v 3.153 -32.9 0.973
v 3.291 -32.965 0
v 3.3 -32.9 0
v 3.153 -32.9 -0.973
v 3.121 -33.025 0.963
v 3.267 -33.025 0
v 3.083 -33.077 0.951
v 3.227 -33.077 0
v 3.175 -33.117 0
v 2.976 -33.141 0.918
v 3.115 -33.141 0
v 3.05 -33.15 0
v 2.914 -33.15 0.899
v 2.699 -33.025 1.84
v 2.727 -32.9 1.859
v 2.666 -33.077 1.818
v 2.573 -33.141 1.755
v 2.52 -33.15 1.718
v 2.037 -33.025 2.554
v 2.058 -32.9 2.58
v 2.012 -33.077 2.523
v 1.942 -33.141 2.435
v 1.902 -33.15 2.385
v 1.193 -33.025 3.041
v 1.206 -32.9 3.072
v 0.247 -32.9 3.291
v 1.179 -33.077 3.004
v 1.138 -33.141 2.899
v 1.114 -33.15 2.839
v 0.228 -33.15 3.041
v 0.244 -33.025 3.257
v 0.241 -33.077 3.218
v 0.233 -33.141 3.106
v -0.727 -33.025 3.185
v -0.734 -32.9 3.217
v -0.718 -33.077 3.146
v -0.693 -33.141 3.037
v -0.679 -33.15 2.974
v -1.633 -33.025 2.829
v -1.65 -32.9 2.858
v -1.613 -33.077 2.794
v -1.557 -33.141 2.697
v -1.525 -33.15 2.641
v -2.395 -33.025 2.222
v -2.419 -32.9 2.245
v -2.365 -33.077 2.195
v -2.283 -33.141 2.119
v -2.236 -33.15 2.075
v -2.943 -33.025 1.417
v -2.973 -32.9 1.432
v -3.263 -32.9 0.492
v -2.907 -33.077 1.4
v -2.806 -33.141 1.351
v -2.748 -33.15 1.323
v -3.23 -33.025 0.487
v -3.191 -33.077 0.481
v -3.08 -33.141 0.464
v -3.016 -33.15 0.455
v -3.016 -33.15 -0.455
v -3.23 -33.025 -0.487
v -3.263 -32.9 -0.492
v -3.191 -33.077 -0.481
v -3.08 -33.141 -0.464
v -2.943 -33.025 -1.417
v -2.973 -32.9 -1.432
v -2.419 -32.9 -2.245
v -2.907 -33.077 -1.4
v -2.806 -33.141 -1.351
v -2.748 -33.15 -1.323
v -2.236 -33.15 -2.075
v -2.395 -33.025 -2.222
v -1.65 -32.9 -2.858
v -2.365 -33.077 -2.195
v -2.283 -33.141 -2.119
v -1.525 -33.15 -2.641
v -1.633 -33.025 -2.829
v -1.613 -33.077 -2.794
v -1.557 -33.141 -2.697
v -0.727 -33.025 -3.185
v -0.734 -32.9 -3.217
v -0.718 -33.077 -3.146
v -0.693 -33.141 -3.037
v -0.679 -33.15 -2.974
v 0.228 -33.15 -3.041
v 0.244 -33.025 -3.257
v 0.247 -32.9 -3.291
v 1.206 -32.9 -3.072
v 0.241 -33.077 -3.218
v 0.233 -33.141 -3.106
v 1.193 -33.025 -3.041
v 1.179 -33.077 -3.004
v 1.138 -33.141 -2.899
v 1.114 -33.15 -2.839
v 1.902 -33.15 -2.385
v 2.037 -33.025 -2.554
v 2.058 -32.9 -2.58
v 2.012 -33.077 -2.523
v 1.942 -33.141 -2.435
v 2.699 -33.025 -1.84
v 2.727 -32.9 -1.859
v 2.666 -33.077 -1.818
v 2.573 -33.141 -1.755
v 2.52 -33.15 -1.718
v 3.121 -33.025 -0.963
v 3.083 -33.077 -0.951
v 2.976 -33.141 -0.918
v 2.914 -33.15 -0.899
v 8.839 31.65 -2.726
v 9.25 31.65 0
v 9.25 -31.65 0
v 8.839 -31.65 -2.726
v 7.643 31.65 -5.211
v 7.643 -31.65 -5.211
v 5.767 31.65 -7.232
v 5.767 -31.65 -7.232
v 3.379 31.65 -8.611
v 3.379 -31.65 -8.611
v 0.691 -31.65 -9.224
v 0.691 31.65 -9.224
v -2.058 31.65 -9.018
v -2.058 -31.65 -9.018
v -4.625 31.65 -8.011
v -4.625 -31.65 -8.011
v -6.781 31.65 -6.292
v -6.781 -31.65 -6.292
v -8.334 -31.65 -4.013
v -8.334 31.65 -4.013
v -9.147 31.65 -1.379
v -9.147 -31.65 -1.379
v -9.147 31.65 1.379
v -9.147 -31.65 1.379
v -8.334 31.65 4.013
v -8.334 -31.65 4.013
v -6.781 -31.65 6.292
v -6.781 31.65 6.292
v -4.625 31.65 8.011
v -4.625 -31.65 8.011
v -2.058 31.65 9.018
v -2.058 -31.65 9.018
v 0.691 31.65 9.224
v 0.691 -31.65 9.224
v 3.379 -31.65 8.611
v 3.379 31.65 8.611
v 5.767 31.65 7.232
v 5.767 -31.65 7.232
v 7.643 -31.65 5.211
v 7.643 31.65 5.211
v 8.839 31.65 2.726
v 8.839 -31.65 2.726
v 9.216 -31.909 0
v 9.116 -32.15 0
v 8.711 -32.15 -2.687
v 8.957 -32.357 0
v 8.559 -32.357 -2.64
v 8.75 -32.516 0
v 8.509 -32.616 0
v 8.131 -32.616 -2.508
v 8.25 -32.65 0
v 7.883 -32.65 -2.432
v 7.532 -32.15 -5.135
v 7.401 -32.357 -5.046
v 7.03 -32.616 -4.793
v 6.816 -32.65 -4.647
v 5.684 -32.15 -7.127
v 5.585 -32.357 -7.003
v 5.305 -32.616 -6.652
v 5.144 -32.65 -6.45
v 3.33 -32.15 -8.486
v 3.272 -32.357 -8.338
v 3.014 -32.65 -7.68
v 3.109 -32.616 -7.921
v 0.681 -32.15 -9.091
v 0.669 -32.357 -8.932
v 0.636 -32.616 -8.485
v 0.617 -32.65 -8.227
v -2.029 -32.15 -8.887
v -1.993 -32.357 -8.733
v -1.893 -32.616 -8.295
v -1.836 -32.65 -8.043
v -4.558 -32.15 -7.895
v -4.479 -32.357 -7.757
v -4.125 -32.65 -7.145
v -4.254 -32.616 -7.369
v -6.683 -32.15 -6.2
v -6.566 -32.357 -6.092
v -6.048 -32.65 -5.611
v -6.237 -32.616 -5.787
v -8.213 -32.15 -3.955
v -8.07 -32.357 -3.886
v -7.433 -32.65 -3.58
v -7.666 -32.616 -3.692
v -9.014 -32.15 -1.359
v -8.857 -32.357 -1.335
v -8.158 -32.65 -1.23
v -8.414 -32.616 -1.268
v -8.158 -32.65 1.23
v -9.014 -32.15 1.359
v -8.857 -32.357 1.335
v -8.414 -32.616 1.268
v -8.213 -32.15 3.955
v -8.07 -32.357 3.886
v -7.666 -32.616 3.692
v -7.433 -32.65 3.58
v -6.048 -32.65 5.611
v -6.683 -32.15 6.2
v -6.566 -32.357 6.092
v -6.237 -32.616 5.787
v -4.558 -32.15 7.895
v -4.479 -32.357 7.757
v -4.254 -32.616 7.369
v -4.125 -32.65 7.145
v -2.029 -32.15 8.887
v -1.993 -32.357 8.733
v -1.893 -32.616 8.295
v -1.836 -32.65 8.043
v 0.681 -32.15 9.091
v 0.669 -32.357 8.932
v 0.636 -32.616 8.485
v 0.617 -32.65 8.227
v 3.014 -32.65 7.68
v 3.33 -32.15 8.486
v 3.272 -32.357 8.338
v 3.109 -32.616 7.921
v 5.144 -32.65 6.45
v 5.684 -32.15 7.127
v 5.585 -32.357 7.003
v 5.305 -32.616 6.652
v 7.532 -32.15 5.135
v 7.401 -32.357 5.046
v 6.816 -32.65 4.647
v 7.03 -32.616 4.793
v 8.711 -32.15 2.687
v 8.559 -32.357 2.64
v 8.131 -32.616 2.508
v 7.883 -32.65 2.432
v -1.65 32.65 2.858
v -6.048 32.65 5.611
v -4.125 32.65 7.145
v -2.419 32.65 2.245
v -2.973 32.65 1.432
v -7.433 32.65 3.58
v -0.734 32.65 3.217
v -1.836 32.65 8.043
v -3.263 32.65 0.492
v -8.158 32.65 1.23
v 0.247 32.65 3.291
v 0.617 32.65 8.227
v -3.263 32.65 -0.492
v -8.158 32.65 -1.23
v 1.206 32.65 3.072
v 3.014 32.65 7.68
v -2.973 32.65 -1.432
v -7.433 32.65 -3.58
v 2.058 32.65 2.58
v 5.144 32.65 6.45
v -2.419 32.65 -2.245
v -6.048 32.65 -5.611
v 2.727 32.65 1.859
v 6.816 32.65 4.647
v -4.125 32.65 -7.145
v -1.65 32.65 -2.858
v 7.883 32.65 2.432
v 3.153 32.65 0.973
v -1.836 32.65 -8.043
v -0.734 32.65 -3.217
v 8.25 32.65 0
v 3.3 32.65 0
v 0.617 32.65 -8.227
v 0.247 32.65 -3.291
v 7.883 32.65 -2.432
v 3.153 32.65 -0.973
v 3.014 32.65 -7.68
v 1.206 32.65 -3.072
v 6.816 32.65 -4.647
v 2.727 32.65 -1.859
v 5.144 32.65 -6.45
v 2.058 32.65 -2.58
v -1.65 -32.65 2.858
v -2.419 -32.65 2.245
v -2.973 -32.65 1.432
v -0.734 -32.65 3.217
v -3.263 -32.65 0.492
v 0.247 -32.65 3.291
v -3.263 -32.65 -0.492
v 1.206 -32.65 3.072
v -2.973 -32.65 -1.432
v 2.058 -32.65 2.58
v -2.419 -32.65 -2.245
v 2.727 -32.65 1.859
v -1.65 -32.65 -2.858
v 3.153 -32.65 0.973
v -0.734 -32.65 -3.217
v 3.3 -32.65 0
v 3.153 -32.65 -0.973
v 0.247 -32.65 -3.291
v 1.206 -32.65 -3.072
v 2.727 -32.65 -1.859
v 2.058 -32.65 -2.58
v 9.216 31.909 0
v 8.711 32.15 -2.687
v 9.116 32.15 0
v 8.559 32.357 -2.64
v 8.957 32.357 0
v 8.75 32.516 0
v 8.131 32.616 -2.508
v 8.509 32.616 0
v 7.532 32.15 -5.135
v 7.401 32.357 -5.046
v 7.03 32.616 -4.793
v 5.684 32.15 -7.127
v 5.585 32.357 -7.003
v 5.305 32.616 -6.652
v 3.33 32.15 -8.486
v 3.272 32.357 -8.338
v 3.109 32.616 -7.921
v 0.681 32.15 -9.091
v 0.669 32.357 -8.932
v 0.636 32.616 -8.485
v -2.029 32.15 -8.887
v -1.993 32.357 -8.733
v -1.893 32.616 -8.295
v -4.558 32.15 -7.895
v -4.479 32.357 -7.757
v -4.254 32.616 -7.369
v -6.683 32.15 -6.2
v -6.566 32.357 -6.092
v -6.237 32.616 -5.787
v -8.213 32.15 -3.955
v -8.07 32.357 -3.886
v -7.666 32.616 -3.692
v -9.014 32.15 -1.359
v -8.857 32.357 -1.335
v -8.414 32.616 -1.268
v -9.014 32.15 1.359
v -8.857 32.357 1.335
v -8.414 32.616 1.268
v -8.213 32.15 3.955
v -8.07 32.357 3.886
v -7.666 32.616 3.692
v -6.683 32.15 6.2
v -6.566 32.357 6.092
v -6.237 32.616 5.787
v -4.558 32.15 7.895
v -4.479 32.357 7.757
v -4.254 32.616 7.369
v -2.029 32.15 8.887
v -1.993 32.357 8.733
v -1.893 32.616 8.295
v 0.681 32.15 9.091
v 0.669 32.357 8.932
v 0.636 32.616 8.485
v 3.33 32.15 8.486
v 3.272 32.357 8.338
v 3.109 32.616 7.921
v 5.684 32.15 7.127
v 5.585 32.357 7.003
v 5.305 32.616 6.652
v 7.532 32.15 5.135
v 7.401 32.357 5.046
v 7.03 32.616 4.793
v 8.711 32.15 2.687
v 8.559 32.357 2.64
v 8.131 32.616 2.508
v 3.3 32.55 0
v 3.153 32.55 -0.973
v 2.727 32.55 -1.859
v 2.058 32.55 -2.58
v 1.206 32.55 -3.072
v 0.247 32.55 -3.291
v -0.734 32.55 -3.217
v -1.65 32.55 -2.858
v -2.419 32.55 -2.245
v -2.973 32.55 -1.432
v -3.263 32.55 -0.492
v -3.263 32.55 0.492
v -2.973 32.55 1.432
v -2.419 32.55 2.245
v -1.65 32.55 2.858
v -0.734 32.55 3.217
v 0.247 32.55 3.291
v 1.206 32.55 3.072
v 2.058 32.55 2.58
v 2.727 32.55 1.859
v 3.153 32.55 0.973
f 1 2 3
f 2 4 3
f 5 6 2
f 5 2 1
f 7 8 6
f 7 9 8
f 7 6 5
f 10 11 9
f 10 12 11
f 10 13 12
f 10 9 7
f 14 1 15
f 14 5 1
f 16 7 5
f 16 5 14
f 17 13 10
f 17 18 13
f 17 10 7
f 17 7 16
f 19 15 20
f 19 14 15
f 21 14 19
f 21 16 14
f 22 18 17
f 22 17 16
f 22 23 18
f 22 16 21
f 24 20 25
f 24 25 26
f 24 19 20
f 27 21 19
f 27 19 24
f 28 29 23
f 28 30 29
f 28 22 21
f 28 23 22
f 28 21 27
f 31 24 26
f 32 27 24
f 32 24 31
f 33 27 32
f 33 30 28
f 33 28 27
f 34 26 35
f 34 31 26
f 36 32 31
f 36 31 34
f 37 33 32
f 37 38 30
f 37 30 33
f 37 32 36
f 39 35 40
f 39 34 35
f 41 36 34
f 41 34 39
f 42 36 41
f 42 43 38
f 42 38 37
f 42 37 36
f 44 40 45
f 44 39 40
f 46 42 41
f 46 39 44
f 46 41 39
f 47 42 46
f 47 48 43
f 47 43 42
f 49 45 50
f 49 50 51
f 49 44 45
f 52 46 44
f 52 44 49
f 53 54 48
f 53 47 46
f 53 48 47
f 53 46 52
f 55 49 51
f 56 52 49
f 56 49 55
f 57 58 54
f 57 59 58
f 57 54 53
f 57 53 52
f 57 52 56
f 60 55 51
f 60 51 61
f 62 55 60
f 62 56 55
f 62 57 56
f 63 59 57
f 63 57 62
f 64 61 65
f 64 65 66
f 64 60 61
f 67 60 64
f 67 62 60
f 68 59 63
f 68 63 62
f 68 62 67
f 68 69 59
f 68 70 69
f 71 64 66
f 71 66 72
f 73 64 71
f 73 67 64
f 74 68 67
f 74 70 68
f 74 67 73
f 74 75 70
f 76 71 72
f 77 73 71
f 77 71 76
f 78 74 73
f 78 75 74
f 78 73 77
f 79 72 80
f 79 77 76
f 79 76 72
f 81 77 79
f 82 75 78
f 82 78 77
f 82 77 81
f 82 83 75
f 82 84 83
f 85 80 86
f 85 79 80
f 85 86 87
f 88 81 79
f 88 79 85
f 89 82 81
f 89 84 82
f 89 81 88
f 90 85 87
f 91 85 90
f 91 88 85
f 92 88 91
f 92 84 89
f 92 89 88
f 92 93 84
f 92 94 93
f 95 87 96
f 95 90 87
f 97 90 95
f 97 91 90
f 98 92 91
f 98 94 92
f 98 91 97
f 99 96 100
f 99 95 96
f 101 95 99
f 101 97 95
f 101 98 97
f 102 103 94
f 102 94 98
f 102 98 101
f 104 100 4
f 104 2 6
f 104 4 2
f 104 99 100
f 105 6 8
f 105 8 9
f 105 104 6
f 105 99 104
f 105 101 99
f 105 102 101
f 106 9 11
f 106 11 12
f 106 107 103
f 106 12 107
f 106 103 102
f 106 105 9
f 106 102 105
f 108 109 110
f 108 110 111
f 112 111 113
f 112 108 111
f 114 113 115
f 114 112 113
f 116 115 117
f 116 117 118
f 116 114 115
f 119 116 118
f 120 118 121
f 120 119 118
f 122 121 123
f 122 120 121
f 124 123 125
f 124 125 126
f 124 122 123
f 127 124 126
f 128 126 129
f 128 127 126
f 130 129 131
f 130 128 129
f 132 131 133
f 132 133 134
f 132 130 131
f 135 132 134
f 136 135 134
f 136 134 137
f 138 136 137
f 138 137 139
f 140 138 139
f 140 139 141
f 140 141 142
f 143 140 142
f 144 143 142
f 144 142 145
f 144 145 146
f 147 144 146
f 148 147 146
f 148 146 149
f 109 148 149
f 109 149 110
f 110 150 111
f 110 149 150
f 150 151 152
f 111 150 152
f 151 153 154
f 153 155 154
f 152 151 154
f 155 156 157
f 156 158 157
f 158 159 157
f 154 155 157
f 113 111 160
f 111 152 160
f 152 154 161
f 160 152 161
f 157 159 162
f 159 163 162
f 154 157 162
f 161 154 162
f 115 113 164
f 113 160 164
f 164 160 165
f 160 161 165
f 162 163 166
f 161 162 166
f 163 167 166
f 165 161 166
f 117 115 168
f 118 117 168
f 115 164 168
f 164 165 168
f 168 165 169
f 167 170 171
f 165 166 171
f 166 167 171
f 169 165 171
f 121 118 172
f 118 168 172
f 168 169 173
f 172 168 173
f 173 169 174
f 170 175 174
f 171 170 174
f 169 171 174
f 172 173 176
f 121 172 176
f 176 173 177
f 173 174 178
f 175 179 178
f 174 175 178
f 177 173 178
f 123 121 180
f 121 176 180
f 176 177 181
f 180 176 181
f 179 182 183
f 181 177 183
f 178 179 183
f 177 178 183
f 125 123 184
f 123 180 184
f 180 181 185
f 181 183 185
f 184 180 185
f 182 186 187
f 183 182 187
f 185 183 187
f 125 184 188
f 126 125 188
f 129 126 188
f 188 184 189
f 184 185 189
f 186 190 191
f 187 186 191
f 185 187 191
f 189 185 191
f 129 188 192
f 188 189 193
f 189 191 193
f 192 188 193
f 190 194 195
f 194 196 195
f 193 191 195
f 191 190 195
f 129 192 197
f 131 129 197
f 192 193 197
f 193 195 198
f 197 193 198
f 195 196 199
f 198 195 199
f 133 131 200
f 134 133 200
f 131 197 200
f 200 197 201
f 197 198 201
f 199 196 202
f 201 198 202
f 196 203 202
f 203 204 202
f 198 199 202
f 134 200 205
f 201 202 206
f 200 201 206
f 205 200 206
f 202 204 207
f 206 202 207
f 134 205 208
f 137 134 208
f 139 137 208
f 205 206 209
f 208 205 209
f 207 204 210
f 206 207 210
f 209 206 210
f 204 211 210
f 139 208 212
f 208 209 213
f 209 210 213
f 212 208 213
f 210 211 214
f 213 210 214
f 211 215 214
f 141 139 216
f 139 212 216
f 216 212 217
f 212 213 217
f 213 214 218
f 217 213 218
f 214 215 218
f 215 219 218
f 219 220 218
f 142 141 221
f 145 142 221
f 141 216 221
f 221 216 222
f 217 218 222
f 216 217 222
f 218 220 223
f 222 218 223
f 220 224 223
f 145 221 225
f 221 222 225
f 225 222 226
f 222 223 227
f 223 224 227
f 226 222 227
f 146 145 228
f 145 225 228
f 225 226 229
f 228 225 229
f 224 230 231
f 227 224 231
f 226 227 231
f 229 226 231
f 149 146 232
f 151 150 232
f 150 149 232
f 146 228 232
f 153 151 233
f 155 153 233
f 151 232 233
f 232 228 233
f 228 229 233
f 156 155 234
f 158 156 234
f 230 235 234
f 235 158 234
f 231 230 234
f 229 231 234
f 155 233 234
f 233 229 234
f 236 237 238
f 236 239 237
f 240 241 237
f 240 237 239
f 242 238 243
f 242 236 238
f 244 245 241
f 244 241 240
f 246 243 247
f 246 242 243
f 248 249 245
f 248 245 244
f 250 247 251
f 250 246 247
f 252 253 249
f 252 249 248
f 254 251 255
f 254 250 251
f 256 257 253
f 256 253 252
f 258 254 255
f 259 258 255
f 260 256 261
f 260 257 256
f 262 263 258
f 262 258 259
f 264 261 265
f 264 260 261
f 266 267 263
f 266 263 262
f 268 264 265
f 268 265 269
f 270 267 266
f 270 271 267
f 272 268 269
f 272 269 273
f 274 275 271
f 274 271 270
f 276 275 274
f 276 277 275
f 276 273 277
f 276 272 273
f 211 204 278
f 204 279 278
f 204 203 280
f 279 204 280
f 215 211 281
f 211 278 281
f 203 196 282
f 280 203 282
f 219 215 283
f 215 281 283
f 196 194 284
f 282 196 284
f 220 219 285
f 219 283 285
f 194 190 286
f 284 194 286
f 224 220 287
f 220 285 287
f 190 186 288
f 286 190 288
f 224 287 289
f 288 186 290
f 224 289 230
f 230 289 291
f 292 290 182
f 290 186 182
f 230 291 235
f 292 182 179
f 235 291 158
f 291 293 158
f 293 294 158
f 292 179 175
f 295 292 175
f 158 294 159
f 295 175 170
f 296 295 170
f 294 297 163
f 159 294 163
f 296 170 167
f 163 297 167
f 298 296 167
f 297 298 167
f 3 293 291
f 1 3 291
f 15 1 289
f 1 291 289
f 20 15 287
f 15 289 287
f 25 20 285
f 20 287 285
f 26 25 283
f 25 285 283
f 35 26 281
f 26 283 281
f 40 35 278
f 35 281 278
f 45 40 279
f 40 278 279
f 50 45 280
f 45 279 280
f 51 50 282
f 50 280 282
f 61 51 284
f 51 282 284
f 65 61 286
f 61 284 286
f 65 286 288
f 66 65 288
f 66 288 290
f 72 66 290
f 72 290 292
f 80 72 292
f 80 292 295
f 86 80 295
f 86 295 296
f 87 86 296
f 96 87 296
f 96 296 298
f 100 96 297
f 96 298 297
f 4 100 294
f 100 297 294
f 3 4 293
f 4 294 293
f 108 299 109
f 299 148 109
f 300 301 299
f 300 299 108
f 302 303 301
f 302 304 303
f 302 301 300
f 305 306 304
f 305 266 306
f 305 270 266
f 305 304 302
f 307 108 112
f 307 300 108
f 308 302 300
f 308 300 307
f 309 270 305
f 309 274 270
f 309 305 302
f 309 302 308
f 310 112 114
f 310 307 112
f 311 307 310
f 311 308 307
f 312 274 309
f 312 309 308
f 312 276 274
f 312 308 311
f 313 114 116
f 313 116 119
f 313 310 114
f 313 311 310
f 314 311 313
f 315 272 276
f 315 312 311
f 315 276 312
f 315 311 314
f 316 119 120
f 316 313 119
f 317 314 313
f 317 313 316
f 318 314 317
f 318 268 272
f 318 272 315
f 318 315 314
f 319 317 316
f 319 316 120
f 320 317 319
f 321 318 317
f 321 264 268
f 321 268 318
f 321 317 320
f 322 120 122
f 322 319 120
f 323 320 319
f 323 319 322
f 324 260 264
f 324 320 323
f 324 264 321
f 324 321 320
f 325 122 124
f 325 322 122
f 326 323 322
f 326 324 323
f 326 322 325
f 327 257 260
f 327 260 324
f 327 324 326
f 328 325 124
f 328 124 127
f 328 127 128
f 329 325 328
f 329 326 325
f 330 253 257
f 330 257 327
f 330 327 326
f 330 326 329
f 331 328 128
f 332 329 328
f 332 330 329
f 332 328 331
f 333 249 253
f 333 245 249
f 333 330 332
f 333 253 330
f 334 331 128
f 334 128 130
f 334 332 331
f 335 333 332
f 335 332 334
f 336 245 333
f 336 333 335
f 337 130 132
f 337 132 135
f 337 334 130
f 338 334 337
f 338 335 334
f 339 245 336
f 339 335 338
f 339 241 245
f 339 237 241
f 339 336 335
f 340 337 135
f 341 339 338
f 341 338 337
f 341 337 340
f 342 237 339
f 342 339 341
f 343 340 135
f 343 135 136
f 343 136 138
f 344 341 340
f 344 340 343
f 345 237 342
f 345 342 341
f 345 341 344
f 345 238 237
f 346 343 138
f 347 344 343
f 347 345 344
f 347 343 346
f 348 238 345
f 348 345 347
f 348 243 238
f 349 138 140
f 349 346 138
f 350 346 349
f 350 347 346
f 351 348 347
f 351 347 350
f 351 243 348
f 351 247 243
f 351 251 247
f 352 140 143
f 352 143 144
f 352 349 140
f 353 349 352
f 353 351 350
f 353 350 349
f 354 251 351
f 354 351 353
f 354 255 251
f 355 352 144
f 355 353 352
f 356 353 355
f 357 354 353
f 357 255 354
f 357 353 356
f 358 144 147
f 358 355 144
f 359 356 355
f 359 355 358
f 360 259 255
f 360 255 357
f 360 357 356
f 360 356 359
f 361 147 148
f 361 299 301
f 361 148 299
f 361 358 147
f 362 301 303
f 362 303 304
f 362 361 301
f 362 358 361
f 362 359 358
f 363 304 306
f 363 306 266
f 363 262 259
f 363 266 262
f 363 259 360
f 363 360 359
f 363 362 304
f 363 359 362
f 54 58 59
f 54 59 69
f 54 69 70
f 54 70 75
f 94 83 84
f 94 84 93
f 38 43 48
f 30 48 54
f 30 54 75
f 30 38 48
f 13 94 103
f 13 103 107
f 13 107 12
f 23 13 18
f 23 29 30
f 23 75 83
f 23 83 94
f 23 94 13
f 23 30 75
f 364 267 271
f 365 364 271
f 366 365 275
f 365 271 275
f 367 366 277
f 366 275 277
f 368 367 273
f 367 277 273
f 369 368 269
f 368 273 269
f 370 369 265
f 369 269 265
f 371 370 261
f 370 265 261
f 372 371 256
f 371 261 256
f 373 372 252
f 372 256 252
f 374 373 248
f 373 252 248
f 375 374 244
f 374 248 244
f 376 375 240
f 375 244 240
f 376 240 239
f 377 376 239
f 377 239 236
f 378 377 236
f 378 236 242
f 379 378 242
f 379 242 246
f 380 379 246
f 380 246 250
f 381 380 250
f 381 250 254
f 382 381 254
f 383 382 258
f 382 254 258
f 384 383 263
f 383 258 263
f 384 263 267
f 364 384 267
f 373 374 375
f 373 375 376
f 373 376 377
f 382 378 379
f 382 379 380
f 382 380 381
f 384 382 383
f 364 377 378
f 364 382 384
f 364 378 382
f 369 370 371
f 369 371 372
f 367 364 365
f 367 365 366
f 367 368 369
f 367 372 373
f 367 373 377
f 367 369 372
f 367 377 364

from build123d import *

# Parameters (mm, degrees)
SKETCH2_R           = 9.25
BOSS_EXTRUDE1_DEPTH = 32.65
FILLET1_R           = 1
SKETCH3_R           = 3.3
CUT_EXTRUDE1_DEPTH  = 0.1
SKETCH4_R           = 3.3
BOSS_EXTRUDE2_DEPTH = 0.5
FILLET2_R           = 0.25


with BuildPart() as part:
    # Sketch2 → Boss-Extrude1 (new body, symmetric)
    with BuildSketch(Plane(origin=(0, 0, 0), x_dir=(1, 0, 0), z_dir=(0, 1, 0))):
        Circle(SKETCH2_R)
    extrude(amount=BOSS_EXTRUDE1_DEPTH, both=True)

    # Fillet1
    fillet1_edges = [part.edges().sort_by_distance(p)[0] for p in [
        (-9.25, -32.65, 0),
        (-9.25, 32.65, 0),
    ]]
    fillet(fillet1_edges, radius=FILLET1_R)

    # Sketch3 → Cut-Extrude1 (cut)
    with BuildSketch(Plane(origin=(0, 32.65, 0), x_dir=(1, 0, 0), z_dir=(0, 1, 0))):
        Circle(SKETCH3_R)
    extrude(amount=-CUT_EXTRUDE1_DEPTH, mode=Mode.SUBTRACT)

    # Sketch4 → Boss-Extrude2 (add)
    with BuildSketch(Plane.XZ.offset(32.65)):
        Circle(SKETCH4_R)
    extrude(amount=BOSS_EXTRUDE2_DEPTH)

    # Fillet2
    fillet2_edges = [part.edges().sort_by_distance(p)[0] for p in [
        (-3.3, -33.15, 0),
    ]]
    fillet(fillet2_edges, radius=FILLET2_R)


solid = part.part
